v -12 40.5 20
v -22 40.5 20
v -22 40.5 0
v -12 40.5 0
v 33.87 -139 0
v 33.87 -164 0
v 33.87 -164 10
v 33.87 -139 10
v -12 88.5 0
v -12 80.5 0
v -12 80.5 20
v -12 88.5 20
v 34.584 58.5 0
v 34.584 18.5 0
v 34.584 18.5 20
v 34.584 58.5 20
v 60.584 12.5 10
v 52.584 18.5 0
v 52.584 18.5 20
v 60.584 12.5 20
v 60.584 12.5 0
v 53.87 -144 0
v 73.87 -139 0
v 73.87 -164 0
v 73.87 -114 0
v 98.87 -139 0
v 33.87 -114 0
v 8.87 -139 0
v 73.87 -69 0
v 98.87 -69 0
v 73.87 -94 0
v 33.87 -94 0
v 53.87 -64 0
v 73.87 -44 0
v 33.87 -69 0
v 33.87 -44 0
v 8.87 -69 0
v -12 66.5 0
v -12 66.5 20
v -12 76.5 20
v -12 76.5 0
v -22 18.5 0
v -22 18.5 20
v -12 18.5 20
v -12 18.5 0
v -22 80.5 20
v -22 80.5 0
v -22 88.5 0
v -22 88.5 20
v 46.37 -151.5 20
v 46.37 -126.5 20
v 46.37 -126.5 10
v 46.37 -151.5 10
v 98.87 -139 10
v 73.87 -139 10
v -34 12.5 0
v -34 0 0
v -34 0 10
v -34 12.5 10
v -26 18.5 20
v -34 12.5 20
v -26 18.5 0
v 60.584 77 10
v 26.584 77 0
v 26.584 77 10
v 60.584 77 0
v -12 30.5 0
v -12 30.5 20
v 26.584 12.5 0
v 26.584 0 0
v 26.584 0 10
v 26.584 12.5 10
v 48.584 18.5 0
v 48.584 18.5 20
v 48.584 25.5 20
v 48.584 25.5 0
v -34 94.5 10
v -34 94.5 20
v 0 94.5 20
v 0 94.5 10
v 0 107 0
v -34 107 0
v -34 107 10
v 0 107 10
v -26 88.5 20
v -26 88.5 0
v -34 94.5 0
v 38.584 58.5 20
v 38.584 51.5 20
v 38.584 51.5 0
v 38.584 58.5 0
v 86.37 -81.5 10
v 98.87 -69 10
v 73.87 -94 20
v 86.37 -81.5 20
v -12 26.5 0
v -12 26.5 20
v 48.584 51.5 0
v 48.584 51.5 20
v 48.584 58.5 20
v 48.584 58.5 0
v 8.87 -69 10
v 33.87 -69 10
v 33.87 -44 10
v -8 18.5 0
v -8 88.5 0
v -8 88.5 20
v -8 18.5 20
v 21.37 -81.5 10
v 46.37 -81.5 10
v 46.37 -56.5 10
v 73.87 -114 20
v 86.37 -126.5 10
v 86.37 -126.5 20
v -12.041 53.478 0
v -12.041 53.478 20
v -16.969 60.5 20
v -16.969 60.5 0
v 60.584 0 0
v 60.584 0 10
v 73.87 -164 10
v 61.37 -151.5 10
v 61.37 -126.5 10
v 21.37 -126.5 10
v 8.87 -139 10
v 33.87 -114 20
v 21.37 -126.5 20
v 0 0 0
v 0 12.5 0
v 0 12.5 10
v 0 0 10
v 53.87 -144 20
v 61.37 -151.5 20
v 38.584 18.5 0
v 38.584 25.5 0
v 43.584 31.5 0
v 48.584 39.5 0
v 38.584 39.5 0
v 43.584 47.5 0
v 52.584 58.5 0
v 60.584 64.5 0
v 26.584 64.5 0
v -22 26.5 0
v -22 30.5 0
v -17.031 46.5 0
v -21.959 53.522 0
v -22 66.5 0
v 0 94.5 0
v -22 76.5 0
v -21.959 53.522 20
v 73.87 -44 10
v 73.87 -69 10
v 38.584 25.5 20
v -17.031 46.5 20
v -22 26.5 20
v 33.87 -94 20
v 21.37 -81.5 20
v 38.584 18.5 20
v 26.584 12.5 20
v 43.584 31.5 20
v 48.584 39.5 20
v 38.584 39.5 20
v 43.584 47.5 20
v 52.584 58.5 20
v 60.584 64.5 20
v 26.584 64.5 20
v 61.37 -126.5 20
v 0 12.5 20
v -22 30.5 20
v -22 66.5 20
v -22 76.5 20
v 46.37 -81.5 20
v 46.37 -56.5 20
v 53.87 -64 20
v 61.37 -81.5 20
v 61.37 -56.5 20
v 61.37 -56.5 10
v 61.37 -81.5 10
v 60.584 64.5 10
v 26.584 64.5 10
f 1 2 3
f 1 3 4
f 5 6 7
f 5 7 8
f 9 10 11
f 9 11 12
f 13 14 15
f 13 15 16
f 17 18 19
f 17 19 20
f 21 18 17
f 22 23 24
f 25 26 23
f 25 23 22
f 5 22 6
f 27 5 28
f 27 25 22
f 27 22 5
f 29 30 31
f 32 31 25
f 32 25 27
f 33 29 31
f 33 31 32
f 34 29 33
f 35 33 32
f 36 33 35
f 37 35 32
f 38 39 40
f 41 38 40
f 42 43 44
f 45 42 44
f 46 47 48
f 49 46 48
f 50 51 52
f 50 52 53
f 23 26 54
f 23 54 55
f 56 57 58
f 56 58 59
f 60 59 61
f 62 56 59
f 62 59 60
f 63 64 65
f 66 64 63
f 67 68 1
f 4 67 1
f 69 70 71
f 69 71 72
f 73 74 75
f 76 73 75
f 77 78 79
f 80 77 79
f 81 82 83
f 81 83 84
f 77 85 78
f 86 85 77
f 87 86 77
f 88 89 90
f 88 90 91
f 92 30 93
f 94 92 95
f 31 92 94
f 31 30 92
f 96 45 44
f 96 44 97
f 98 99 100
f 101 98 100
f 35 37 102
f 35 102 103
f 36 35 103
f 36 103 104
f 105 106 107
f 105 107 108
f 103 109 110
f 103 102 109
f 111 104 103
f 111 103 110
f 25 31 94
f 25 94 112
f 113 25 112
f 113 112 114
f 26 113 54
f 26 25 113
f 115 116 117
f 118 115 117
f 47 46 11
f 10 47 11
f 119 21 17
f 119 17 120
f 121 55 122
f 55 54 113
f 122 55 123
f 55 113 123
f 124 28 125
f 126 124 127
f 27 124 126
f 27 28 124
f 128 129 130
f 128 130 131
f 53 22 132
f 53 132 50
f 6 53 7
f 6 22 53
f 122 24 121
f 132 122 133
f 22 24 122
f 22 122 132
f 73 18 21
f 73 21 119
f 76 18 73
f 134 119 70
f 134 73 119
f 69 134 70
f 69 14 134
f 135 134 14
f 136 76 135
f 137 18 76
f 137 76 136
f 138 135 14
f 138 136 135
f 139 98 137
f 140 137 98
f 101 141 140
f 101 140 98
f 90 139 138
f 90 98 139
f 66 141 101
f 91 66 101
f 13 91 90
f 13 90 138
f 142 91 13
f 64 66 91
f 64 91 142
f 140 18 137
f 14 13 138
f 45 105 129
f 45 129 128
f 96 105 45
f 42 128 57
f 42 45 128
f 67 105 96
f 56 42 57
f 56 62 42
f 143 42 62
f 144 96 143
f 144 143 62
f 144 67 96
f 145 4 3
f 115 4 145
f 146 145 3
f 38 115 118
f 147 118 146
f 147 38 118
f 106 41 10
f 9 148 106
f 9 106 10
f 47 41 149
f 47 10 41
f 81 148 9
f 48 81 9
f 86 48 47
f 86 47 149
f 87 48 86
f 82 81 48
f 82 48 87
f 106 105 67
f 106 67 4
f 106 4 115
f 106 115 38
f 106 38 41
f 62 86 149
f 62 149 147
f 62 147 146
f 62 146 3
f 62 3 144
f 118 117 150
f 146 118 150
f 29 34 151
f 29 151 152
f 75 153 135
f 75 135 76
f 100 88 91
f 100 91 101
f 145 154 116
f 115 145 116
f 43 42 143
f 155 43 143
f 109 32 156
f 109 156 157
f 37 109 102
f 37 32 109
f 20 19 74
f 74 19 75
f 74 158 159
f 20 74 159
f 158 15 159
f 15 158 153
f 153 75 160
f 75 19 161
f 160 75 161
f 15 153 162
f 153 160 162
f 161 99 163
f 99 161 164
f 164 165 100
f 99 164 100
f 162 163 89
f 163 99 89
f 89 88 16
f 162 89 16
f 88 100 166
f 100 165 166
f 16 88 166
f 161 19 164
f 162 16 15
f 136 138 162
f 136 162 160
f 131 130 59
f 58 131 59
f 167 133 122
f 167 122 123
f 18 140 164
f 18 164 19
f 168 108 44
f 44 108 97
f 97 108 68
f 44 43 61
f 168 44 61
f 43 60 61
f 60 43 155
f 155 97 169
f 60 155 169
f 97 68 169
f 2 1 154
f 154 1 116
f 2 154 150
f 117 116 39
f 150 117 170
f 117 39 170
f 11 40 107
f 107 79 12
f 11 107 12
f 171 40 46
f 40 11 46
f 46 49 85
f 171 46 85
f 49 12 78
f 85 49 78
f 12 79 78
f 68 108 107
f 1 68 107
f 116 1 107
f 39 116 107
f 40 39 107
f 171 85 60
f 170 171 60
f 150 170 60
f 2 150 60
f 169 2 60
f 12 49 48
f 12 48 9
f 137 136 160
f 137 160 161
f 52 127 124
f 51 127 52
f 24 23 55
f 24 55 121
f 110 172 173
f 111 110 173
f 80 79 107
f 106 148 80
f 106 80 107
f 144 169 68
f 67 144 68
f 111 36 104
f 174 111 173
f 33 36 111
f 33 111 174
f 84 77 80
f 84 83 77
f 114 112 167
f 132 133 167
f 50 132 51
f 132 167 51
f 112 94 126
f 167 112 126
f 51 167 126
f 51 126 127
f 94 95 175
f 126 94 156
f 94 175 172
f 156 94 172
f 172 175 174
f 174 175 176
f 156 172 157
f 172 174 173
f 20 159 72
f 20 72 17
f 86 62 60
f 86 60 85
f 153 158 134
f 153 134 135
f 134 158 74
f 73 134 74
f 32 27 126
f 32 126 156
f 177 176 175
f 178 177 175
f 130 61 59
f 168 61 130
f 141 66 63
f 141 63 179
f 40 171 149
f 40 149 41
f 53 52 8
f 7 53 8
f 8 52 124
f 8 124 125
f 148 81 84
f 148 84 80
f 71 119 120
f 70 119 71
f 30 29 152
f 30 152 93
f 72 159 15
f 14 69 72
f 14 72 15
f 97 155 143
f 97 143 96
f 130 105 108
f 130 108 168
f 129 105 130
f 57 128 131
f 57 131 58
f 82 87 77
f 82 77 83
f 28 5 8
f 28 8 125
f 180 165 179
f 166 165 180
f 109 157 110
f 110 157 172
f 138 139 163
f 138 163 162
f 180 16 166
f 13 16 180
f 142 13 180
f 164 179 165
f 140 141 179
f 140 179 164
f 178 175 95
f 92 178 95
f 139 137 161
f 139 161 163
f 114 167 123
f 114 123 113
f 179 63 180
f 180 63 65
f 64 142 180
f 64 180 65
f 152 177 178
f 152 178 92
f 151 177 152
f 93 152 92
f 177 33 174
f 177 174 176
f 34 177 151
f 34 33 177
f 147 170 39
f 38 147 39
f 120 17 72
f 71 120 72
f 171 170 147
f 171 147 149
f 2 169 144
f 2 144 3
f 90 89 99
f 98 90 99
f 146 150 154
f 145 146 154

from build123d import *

# Parameters (mm, degrees)
PAD_DEPTH       = 20
POCKET_DEPTH    = 10
POCKET001_DEPTH = 10
SKETCH008_W     = 10
SKETCH008_H     = 8
SKETCH008_H_2   = 10
POCKET007_DEPTH = 20.001
PAD001_DEPTH    = 20
POCKET002_DEPTH = 10
SKETCH009_W     = 10
SKETCH009_H     = 7
POCKET006_DEPTH = 20.001
PAD002_DEPTH    = 20
POCKET003_DEPTH = 10
POCKET004_DEPTH = 10


with BuildPart() as body:
    # Sketch → Pad (new body)
    with BuildSketch(Plane.XY):
        Polygon((-34.000003, 107.000004), (-3e-06, 107.000004), (-3e-06, 94.500004), (-7.999984, 88.499979), (-7.999984, 18.499979), (3.2e-05, 12.5), (0, 0), (-34, 0), (-34, 12.5), (-25.999984, 18.499979), (-25.999984, 88.499979), (-33.999965, 94.500004), align=None)
    extrude(amount=PAD_DEPTH)

    # Sketch003 (on Face14 of Pad) → Pocket (cut)
    with BuildSketch(Plane.XY.offset(20)):
        Polygon((-34, 12.5), (3.2e-05, 12.5), (0, 0), (-34, 0), align=None)
    extrude(amount=-POCKET_DEPTH, mode=Mode.SUBTRACT)

    # Sketch004 (on Face5 of Pocket) → Pocket001 (cut)
    with BuildSketch(Plane.XY.offset(20)):
        Polygon((-33.999965, 94.500004), (-3e-06, 94.500004), (-3e-06, 107.000004), (-34.000003, 107.000004), align=None)
    extrude(amount=-POCKET001_DEPTH, mode=Mode.SUBTRACT)

    # Sketch008 (on Face16 of Pocket001) → Pocket007 (cut, through all)
    with BuildSketch(Plane.XY.offset(20)):
        with Locations((-16.999984, 84.500004)):
            Rectangle(SKETCH008_W, SKETCH008_H)
        with Locations((-16.999984, 22.5)):
            Rectangle(SKETCH008_W, SKETCH008_H)
        with Locations((-16.999984, 35.5)):
            Rectangle(SKETCH008_W, SKETCH008_H_2)
        with Locations((-16.999984, 71.500004)):
            Rectangle(SKETCH008_W, SKETCH008_H_2)
        Polygon((-16.969085, 60.500004), (-21.959162, 53.521893), (-17.030885, 46.5), (-12.040809, 53.478111), align=None)
    extrude(amount=-POCKET007_DEPTH, mode=Mode.SUBTRACT)


with BuildPart() as i2_4cm:
    # Sketch001 → Pad001 (new body)
    with BuildSketch(Plane.XY):
        Polygon((-33.999992, 76.999989), (8e-06, 76.999989), (8e-06, 64.499989), (-7.999978, 58.49997), (-7.999978, 18.49997), (4.5e-05, 12.5), (0, 0), (-34, 0), (-34, 12.5), (-25.999978, 18.49997), (-25.999978, 58.49997), (-33.999963, 64.499989), align=None)
    extrude(amount=PAD001_DEPTH)

    # Sketch005 (on Face14 of Pad001) → Pocket002 (cut)
    with BuildSketch(Plane.XY.offset(20)):
        Polygon((-34, 12.5), (4.5e-05, 12.5), (0, 0), (-34, 0), align=None)
        Polygon((-33.999963, 64.499989), (-33.999992, 76.999989), (8e-06, 76.999989), (8e-06, 64.499989), align=None)
    extrude(amount=-POCKET002_DEPTH, mode=Mode.SUBTRACT)

    # Sketch009 (on Face16 of Pocket002) → Pocket006 (cut, through all)
    with BuildSketch(Plane.XY.offset(20)):
        with Locations((-16.999978, 54.999989)):
            Rectangle(SKETCH009_W, SKETCH009_H)
        with Locations((-16.999978, 22)):
            Rectangle(SKETCH009_W, SKETCH009_H)
        Polygon((-21.999978, 39.5), (-16.999978, 31.500011), (-11.999978, 39.5), (-16.999978, 47.499989), align=None)
    extrude(amount=-POCKET006_DEPTH, mode=Mode.SUBTRACT)


with BuildPart() as i2_4cm_1:
    # Body001 placement: moved
    add(i2_4cm.part.moved(Location((60.5835, 0, 0))))


with BuildPart() as star:
    # Sketch002 → Pad002 (new body)
    with BuildSketch(Plane.XY):
        Polygon((33.87, -44), (53.87, -64), (73.87, -44), (73.87, -69), (98.87, -69), (73.87, -94), (73.87, -114), (98.87, -139), (73.87, -139), (73.87, -164), (53.87, -144), (33.87, -164), (33.87, -139), (8.87, -139), (33.87, -114), (33.87, -94), (8.87, -69), (33.87, -69), align=None)
    extrude(amount=PAD002_DEPTH)

    # Sketch006 (on Face20 of Pad002) → Pocket003 (cut)
    with BuildSketch(Plane.XY.offset(20)):
        Polygon((21.37, -126.5), (46.37, -126.5), (46.37, -151.5), (33.87, -164), (33.87, -139), (8.87, -139), align=None)
        Polygon((21.37, -81.5), (46.37, -81.5), (46.37, -56.5), (33.87, -44), (33.87, -69), (8.87, -69), align=None)
        Polygon((73.87, -44), (61.37, -56.5), (61.37, -81.5), (86.37, -81.5), (98.87, -69), (73.87, -69), align=None)
    extrude(amount=-POCKET003_DEPTH, mode=Mode.SUBTRACT)

    # Sketch007 (on Face23 of Pocket003) → Pocket004 (cut)
    with BuildSketch(Plane.XY.offset(20)):
        Polygon((61.37, -151.5), (61.37, -126.5), (86.37, -126.5), (98.87, -139), (73.87, -139), (73.87, -164), align=None)
    extrude(amount=-POCKET004_DEPTH, mode=Mode.SUBTRACT)


solid = Compound([body.part, i2_4cm_1.part, star.part])
